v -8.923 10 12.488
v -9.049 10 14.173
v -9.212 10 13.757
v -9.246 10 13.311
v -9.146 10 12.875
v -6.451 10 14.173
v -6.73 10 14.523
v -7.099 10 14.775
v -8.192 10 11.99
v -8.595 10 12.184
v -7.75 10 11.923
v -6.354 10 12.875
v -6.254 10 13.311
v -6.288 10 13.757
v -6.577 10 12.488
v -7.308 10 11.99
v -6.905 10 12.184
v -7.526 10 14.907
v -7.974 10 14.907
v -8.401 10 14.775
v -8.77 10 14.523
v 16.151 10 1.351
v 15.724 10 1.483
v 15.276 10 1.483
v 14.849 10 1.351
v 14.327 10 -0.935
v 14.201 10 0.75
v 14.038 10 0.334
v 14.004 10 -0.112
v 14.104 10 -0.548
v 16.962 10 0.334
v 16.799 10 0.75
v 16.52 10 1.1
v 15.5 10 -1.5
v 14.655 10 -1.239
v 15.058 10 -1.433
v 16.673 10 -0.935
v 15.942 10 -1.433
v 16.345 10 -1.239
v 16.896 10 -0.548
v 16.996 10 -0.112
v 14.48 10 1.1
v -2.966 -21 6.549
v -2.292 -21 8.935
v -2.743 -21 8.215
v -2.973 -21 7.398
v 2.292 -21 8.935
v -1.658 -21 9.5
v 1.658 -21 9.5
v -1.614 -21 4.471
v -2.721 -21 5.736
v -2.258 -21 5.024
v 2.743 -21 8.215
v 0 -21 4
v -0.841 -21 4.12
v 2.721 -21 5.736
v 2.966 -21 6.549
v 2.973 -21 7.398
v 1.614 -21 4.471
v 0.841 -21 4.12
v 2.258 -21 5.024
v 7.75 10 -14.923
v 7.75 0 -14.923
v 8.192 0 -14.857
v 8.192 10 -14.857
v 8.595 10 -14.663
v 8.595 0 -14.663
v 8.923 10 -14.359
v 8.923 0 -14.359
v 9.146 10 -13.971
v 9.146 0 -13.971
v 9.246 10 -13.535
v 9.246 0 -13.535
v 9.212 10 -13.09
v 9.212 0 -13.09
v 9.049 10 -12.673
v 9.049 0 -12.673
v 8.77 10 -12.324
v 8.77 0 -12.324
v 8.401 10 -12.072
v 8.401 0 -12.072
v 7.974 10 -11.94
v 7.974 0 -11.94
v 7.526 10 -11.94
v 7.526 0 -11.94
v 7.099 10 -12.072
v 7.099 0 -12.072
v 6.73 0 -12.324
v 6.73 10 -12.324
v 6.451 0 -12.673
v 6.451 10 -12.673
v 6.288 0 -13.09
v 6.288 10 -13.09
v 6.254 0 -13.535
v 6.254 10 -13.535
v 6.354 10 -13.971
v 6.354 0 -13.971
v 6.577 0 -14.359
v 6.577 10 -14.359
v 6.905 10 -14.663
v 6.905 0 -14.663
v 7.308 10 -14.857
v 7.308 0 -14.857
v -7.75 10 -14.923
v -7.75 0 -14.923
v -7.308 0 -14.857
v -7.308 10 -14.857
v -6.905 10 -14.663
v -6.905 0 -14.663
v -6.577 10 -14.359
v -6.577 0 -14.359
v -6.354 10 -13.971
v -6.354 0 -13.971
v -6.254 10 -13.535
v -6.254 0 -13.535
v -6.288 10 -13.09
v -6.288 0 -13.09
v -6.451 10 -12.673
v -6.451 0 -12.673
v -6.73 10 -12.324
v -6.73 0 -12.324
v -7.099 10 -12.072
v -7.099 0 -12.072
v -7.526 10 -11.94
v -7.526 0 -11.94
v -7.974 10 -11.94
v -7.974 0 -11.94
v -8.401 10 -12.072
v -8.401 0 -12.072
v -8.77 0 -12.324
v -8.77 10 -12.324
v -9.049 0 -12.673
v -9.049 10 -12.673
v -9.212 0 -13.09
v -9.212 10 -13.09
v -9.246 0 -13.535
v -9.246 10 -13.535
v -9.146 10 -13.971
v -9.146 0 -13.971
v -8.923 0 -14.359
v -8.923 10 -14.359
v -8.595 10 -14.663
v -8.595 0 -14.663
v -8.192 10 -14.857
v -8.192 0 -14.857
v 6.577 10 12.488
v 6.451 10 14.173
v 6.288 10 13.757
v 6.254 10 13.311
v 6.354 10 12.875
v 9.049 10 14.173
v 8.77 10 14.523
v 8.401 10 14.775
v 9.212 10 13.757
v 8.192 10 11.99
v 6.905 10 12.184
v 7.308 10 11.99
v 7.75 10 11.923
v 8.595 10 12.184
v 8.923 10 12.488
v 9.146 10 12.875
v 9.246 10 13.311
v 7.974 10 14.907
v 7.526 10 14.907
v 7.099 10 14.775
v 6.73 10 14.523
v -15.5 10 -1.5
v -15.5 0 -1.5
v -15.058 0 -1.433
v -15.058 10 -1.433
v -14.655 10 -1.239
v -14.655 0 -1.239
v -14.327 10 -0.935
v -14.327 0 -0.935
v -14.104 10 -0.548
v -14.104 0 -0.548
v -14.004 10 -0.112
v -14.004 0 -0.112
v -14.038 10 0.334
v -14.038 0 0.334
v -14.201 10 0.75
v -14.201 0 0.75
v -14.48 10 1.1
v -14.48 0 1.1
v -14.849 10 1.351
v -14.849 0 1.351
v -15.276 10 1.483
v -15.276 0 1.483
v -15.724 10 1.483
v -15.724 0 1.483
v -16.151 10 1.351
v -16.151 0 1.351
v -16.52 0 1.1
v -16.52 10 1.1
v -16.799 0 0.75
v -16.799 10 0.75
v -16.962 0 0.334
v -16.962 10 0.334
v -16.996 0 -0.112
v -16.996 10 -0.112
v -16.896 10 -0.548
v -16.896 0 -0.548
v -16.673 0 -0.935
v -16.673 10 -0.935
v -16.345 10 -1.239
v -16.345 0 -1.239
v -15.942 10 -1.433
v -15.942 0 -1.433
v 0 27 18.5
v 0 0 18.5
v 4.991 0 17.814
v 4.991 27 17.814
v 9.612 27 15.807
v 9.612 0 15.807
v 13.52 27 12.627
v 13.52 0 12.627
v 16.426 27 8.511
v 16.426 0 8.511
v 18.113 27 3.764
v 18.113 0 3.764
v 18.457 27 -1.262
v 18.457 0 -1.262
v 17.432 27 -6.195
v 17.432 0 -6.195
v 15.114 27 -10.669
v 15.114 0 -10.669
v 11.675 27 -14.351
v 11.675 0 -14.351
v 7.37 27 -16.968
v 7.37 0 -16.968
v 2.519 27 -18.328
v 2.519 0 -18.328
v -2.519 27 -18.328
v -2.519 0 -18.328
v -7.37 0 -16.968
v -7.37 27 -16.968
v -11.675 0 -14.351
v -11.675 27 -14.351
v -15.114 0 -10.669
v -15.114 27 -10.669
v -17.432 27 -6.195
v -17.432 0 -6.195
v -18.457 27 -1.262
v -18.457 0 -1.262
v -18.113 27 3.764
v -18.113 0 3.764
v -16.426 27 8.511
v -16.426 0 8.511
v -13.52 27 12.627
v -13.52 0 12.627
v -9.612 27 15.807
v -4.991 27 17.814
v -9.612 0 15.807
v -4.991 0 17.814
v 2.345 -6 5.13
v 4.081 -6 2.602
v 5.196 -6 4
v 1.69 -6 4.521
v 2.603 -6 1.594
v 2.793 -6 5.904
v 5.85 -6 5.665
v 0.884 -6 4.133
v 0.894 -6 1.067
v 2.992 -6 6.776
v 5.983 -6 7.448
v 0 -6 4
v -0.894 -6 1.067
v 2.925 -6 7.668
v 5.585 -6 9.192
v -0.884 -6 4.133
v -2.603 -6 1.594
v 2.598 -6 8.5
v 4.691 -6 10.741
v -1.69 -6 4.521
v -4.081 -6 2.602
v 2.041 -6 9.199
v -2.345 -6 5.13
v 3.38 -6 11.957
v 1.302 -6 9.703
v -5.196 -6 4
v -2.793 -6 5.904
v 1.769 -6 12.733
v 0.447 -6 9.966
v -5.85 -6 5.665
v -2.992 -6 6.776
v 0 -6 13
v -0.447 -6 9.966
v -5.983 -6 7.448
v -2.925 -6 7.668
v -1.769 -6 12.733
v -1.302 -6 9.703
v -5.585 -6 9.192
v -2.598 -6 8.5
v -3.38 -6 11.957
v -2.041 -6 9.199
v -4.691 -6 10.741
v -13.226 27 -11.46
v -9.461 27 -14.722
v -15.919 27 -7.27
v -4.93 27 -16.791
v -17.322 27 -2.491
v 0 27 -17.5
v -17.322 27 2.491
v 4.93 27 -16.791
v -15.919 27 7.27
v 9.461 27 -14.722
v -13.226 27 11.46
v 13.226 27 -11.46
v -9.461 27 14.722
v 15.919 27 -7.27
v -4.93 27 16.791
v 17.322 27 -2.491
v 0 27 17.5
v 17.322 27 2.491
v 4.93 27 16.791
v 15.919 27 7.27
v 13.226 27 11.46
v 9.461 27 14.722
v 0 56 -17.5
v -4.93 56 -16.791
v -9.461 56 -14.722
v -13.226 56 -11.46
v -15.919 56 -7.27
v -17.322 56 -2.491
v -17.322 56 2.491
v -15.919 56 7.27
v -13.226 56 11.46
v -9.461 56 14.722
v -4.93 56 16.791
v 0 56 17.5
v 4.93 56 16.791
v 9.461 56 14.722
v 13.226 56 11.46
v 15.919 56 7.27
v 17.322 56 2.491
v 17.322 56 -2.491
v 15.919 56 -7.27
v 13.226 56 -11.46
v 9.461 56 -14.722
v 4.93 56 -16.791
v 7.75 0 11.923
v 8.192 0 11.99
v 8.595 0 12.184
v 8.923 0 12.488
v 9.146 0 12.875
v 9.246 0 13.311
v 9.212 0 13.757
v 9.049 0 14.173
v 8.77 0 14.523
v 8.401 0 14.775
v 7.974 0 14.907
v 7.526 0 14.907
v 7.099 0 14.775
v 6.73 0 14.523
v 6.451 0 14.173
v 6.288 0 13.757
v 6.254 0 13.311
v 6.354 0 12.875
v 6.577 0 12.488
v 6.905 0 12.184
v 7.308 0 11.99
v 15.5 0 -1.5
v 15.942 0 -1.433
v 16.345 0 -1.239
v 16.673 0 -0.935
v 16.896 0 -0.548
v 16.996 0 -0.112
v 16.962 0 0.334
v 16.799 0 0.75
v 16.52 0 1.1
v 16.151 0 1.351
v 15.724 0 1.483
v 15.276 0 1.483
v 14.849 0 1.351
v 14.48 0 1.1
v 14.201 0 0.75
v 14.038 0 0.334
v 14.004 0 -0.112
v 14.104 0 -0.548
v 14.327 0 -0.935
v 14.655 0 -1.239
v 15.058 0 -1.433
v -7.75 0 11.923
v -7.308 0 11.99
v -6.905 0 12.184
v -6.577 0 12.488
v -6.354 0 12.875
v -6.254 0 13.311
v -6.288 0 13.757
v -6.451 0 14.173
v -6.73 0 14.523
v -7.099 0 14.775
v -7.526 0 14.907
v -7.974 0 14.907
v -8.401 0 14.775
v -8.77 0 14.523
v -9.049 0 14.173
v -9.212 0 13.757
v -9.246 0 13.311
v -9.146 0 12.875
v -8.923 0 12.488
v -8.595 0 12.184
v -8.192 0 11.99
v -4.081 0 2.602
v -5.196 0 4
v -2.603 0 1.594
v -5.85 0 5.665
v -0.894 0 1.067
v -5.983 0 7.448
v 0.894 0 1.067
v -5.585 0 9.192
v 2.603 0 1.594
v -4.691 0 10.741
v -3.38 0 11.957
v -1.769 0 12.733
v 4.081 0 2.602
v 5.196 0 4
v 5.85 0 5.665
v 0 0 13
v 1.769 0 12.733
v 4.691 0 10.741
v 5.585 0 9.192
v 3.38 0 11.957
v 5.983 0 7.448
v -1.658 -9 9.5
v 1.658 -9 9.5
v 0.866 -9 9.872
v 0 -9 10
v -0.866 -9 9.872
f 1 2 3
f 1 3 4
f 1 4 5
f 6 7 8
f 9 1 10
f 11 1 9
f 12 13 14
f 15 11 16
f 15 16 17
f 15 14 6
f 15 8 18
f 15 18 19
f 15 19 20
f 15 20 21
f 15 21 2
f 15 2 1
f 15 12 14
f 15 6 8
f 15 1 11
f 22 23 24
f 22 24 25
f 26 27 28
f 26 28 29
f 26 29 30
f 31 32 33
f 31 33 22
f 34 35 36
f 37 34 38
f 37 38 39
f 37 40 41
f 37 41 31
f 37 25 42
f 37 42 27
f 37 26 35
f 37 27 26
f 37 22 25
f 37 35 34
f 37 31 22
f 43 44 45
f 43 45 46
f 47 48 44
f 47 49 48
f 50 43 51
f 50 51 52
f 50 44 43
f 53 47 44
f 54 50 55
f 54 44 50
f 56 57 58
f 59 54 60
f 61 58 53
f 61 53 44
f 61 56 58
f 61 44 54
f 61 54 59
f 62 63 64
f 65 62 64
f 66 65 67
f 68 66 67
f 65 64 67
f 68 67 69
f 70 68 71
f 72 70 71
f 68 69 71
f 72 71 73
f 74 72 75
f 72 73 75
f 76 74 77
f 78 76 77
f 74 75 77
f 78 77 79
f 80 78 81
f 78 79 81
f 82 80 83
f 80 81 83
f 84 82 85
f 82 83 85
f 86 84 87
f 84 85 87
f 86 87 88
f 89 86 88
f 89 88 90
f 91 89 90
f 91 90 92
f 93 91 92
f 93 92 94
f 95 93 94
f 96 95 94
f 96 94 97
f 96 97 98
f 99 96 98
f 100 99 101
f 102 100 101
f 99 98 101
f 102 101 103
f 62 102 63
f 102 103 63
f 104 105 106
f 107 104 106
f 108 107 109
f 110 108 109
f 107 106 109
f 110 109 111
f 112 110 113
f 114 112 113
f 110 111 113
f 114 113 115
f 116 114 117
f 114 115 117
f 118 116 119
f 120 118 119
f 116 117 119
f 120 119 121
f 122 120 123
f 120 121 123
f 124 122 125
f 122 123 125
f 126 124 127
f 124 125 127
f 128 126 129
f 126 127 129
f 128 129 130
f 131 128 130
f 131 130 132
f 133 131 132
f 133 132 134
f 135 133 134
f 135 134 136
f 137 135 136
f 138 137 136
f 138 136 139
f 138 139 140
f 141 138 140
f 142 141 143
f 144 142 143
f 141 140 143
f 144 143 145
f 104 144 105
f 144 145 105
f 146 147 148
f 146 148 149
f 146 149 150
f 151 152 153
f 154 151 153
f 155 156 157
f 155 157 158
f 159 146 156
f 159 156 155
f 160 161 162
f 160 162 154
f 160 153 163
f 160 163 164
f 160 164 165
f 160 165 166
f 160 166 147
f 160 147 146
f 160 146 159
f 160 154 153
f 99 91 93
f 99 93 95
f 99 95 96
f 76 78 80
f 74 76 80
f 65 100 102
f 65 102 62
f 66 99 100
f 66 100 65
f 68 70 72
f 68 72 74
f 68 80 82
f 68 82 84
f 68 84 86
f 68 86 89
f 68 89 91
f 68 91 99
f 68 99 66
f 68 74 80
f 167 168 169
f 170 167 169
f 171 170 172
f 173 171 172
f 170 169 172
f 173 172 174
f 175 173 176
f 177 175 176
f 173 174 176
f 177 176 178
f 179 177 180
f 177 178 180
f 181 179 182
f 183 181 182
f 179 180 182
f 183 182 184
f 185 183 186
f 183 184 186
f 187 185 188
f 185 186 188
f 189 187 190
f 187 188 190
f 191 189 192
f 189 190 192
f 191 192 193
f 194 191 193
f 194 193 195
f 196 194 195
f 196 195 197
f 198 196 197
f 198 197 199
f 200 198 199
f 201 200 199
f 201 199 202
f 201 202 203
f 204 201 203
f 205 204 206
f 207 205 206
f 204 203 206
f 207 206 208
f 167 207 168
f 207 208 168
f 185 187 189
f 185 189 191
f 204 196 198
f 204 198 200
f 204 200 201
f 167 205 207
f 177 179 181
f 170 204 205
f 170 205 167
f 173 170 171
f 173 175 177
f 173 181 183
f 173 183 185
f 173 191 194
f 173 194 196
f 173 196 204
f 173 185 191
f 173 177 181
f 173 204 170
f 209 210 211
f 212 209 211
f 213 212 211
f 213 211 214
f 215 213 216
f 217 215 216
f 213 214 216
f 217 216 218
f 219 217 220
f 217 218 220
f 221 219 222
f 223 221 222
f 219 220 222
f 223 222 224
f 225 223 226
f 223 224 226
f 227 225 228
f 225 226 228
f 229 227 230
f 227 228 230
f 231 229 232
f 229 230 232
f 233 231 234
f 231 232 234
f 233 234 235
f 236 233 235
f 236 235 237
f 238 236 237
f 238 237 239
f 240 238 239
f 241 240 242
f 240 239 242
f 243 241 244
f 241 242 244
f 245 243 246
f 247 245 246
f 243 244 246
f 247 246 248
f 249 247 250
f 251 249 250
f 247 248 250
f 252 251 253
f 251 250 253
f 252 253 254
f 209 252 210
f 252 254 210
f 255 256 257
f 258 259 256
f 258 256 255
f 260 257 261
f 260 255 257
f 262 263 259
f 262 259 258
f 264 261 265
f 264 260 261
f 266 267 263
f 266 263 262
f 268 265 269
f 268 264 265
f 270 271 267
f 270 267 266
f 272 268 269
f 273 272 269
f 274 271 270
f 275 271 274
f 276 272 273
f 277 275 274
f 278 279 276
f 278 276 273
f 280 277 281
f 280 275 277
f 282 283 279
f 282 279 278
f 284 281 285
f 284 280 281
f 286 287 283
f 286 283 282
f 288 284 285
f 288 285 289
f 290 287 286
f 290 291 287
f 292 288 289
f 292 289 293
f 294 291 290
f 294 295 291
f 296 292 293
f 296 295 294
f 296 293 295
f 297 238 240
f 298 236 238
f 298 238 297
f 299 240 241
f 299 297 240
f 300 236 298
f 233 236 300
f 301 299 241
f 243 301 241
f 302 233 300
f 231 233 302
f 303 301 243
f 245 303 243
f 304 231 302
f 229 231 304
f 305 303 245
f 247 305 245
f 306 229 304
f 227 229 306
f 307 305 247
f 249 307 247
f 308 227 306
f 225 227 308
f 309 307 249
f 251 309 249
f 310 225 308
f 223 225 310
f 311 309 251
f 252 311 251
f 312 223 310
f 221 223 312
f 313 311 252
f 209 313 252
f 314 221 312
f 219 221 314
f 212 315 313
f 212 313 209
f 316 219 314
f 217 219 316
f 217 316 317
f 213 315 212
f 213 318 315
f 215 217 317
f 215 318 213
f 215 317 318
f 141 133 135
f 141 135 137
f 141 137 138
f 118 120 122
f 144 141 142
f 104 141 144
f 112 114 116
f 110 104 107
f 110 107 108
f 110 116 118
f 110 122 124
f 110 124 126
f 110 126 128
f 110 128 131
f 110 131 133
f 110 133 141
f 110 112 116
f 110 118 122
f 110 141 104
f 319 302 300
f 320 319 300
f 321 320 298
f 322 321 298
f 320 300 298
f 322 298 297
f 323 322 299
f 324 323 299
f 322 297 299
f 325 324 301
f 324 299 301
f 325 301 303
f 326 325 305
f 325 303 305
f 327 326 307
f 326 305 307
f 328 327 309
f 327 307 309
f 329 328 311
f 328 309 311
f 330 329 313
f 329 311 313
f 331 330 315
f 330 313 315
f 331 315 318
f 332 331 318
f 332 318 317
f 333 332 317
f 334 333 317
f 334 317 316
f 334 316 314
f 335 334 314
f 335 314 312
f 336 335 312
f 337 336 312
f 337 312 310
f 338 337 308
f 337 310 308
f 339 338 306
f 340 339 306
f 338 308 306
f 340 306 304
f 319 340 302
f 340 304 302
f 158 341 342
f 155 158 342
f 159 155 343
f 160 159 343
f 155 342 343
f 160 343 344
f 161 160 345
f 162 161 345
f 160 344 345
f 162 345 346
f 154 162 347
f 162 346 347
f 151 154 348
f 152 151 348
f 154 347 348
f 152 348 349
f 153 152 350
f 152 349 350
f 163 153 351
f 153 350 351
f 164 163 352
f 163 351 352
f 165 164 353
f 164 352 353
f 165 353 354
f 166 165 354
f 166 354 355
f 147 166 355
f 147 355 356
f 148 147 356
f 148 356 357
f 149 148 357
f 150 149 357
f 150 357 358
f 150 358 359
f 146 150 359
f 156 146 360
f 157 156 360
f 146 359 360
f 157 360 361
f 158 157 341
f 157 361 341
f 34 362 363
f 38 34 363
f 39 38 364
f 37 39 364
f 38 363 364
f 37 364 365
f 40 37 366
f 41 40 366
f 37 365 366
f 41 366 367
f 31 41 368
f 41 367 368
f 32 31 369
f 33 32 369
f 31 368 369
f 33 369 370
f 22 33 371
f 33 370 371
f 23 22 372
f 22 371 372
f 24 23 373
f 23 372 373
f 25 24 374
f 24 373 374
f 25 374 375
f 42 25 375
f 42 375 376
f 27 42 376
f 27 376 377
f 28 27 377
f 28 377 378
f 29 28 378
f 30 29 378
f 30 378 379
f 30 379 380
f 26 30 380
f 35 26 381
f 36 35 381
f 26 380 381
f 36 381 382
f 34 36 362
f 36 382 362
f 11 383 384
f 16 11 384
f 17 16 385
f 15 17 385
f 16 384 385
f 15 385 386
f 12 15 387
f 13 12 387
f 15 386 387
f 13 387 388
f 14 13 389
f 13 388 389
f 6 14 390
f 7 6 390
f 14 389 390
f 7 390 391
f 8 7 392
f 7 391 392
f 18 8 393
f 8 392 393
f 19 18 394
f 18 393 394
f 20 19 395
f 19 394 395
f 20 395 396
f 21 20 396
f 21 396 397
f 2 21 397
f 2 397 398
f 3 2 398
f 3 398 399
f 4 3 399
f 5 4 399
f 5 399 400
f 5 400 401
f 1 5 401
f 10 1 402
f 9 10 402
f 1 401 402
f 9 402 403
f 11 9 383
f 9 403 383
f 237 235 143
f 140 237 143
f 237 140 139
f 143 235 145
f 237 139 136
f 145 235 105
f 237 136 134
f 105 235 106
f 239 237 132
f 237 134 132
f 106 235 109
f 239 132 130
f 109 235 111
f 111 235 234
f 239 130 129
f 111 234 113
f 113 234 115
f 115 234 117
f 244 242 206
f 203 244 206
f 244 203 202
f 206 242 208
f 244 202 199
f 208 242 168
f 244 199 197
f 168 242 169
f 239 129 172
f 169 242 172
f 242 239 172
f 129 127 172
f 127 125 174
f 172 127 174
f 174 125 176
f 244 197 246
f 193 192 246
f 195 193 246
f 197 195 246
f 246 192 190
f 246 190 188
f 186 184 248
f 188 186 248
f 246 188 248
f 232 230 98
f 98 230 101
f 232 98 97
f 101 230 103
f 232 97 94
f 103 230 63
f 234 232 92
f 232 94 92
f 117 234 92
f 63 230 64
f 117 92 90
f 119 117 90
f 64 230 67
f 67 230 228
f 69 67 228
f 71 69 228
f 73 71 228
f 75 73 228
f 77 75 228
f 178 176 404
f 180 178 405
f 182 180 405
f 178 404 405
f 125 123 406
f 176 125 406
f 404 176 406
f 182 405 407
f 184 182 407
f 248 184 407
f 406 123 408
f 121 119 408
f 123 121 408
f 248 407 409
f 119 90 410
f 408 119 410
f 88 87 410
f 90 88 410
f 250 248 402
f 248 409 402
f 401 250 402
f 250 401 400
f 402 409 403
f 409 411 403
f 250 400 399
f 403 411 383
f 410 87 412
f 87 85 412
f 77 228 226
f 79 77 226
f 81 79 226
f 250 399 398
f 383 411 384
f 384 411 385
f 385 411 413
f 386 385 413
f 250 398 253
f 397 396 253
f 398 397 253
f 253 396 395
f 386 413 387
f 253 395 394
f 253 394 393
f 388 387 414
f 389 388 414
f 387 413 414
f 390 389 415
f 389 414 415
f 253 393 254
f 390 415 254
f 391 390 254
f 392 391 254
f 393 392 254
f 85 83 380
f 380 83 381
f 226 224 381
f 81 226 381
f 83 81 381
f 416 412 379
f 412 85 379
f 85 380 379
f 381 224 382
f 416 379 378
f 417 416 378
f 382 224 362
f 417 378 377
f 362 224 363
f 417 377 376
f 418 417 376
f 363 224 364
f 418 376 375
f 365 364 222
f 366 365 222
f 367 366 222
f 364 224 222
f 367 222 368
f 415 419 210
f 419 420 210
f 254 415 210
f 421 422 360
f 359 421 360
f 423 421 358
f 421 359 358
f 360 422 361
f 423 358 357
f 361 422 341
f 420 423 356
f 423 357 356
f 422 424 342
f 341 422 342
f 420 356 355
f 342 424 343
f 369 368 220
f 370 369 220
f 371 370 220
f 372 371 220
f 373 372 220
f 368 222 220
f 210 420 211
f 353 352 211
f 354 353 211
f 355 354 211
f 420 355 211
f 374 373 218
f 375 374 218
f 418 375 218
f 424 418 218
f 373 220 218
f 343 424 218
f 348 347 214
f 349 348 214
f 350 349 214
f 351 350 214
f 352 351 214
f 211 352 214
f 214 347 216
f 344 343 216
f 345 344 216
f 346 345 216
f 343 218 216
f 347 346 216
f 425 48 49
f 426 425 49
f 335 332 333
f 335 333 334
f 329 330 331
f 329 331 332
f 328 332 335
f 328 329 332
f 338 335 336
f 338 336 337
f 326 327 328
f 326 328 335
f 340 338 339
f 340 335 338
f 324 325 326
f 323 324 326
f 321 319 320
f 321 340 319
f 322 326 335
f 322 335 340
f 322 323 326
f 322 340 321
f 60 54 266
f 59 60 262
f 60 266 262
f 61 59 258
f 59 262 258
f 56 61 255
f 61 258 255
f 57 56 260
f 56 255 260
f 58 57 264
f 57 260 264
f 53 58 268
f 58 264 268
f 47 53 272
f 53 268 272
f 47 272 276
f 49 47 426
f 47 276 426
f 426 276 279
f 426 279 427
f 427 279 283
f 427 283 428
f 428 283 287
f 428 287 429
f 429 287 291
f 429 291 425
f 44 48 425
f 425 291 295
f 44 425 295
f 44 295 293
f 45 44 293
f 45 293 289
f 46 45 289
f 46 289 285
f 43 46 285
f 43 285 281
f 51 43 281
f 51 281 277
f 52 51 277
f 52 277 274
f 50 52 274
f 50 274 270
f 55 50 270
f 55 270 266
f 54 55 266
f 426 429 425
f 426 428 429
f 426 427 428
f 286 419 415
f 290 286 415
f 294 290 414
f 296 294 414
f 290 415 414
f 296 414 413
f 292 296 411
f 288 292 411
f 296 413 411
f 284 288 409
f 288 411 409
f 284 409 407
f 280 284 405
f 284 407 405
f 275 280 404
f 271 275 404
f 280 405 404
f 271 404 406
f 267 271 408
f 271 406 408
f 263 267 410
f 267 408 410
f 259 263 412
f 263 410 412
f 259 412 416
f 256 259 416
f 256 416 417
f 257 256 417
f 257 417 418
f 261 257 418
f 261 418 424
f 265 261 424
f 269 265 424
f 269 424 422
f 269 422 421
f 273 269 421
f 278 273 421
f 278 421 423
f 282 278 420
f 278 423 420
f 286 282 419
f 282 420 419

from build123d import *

# Parameters (mm, degrees)
SKIZZE1_R                       = 18.5
AUFSATZ_LINEAR_AUSTRAGEN1_DEPTH = 27
SKIZZE2_R                       = 17.5
AUFSATZ_LINEAR_AUSTRAGEN2_DEPTH = 29
SKIZZE3_R                       = 1.5
SCHNITT_LINEAR_AUSTRAGEN1_DEPTH = 10
SKIZZE4_R                       = 6
AUFSATZ_LINEAR_AUSTRAGEN3_DEPTH = 6
SKIZZE5_R                       = 3
AUFSATZ_LINEAR_AUSTRAGEN4_DEPTH = 15
SKIZZE6_W                       = 6
SKIZZE6_H                       = 1
SCHNITT_LINEAR_AUSTRAGEN2_DEPTH = 12


with BuildPart() as part:
    # Skizze1 → Aufsatz-Linear austragen1 (new body)
    with BuildSketch(Plane(origin=(0, 0, 0), x_dir=(1, 0, 0), z_dir=(0, 1, 0))):
        with Locations(Location((0, 0, 0), (0, 0, 270))):
            Circle(SKIZZE1_R)
    extrude(amount=AUFSATZ_LINEAR_AUSTRAGEN1_DEPTH)

    # Skizze2 → Aufsatz-Linear austragen2 (add)
    with BuildSketch(Plane(origin=(0, 27, 0), x_dir=(1, 0, 0), z_dir=(0, 1, 0))):
        with Locations(Location((0, 0, 0), (0, 0, 90))):
            Circle(SKIZZE2_R)
    extrude(amount=AUFSATZ_LINEAR_AUSTRAGEN2_DEPTH)

    # Skizze3 → Schnitt-Linear austragen1 (cut)
    with BuildSketch(Plane.XZ):
        with Locations(Location((-15.5, 0, 0), (0, 0, 270))):
            Circle(SKIZZE3_R)
        with Locations(Location((15.5, 0, 0), (0, 0, 270))):
            Circle(SKIZZE3_R)
        with Locations(Location((7.75, 13.423393759, 0), (0, 0, 270))):
            Circle(SKIZZE3_R)
        with Locations(Location((-7.75, 13.423393759, 0), (0, 0, 270))):
            Circle(SKIZZE3_R)
        with Locations(Location((-7.75, -13.423393759, 0), (0, 0, 270))):
            Circle(SKIZZE3_R)
        with Locations(Location((7.75, -13.423393759, 0), (0, 0, 270))):
            Circle(SKIZZE3_R)
    extrude(amount=-SCHNITT_LINEAR_AUSTRAGEN1_DEPTH, mode=Mode.SUBTRACT)

    # Skizze4 → Aufsatz-Linear austragen3 (add)
    with BuildSketch(Plane.XZ):
        with Locations(Location((0, 7, 0), (0, 0, 90))):
            Circle(SKIZZE4_R)
    extrude(amount=AUFSATZ_LINEAR_AUSTRAGEN3_DEPTH)

    # Skizze5 → Aufsatz-Linear austragen4 (add)
    with BuildSketch(Plane.XZ.offset(6)):
        with Locations(Location((0, 7, 0), (0, 0, 270))):
            Circle(SKIZZE5_R)
    extrude(amount=AUFSATZ_LINEAR_AUSTRAGEN4_DEPTH)

    # Skizze6 → Schnitt-Linear austragen2 (cut)
    with BuildSketch(Plane.XZ.offset(21)):
        with Locations((0, 10)):
            Rectangle(SKIZZE6_W, SKIZZE6_H)
    extrude(amount=-SCHNITT_LINEAR_AUSTRAGEN2_DEPTH, mode=Mode.SUBTRACT)


solid = part.part
